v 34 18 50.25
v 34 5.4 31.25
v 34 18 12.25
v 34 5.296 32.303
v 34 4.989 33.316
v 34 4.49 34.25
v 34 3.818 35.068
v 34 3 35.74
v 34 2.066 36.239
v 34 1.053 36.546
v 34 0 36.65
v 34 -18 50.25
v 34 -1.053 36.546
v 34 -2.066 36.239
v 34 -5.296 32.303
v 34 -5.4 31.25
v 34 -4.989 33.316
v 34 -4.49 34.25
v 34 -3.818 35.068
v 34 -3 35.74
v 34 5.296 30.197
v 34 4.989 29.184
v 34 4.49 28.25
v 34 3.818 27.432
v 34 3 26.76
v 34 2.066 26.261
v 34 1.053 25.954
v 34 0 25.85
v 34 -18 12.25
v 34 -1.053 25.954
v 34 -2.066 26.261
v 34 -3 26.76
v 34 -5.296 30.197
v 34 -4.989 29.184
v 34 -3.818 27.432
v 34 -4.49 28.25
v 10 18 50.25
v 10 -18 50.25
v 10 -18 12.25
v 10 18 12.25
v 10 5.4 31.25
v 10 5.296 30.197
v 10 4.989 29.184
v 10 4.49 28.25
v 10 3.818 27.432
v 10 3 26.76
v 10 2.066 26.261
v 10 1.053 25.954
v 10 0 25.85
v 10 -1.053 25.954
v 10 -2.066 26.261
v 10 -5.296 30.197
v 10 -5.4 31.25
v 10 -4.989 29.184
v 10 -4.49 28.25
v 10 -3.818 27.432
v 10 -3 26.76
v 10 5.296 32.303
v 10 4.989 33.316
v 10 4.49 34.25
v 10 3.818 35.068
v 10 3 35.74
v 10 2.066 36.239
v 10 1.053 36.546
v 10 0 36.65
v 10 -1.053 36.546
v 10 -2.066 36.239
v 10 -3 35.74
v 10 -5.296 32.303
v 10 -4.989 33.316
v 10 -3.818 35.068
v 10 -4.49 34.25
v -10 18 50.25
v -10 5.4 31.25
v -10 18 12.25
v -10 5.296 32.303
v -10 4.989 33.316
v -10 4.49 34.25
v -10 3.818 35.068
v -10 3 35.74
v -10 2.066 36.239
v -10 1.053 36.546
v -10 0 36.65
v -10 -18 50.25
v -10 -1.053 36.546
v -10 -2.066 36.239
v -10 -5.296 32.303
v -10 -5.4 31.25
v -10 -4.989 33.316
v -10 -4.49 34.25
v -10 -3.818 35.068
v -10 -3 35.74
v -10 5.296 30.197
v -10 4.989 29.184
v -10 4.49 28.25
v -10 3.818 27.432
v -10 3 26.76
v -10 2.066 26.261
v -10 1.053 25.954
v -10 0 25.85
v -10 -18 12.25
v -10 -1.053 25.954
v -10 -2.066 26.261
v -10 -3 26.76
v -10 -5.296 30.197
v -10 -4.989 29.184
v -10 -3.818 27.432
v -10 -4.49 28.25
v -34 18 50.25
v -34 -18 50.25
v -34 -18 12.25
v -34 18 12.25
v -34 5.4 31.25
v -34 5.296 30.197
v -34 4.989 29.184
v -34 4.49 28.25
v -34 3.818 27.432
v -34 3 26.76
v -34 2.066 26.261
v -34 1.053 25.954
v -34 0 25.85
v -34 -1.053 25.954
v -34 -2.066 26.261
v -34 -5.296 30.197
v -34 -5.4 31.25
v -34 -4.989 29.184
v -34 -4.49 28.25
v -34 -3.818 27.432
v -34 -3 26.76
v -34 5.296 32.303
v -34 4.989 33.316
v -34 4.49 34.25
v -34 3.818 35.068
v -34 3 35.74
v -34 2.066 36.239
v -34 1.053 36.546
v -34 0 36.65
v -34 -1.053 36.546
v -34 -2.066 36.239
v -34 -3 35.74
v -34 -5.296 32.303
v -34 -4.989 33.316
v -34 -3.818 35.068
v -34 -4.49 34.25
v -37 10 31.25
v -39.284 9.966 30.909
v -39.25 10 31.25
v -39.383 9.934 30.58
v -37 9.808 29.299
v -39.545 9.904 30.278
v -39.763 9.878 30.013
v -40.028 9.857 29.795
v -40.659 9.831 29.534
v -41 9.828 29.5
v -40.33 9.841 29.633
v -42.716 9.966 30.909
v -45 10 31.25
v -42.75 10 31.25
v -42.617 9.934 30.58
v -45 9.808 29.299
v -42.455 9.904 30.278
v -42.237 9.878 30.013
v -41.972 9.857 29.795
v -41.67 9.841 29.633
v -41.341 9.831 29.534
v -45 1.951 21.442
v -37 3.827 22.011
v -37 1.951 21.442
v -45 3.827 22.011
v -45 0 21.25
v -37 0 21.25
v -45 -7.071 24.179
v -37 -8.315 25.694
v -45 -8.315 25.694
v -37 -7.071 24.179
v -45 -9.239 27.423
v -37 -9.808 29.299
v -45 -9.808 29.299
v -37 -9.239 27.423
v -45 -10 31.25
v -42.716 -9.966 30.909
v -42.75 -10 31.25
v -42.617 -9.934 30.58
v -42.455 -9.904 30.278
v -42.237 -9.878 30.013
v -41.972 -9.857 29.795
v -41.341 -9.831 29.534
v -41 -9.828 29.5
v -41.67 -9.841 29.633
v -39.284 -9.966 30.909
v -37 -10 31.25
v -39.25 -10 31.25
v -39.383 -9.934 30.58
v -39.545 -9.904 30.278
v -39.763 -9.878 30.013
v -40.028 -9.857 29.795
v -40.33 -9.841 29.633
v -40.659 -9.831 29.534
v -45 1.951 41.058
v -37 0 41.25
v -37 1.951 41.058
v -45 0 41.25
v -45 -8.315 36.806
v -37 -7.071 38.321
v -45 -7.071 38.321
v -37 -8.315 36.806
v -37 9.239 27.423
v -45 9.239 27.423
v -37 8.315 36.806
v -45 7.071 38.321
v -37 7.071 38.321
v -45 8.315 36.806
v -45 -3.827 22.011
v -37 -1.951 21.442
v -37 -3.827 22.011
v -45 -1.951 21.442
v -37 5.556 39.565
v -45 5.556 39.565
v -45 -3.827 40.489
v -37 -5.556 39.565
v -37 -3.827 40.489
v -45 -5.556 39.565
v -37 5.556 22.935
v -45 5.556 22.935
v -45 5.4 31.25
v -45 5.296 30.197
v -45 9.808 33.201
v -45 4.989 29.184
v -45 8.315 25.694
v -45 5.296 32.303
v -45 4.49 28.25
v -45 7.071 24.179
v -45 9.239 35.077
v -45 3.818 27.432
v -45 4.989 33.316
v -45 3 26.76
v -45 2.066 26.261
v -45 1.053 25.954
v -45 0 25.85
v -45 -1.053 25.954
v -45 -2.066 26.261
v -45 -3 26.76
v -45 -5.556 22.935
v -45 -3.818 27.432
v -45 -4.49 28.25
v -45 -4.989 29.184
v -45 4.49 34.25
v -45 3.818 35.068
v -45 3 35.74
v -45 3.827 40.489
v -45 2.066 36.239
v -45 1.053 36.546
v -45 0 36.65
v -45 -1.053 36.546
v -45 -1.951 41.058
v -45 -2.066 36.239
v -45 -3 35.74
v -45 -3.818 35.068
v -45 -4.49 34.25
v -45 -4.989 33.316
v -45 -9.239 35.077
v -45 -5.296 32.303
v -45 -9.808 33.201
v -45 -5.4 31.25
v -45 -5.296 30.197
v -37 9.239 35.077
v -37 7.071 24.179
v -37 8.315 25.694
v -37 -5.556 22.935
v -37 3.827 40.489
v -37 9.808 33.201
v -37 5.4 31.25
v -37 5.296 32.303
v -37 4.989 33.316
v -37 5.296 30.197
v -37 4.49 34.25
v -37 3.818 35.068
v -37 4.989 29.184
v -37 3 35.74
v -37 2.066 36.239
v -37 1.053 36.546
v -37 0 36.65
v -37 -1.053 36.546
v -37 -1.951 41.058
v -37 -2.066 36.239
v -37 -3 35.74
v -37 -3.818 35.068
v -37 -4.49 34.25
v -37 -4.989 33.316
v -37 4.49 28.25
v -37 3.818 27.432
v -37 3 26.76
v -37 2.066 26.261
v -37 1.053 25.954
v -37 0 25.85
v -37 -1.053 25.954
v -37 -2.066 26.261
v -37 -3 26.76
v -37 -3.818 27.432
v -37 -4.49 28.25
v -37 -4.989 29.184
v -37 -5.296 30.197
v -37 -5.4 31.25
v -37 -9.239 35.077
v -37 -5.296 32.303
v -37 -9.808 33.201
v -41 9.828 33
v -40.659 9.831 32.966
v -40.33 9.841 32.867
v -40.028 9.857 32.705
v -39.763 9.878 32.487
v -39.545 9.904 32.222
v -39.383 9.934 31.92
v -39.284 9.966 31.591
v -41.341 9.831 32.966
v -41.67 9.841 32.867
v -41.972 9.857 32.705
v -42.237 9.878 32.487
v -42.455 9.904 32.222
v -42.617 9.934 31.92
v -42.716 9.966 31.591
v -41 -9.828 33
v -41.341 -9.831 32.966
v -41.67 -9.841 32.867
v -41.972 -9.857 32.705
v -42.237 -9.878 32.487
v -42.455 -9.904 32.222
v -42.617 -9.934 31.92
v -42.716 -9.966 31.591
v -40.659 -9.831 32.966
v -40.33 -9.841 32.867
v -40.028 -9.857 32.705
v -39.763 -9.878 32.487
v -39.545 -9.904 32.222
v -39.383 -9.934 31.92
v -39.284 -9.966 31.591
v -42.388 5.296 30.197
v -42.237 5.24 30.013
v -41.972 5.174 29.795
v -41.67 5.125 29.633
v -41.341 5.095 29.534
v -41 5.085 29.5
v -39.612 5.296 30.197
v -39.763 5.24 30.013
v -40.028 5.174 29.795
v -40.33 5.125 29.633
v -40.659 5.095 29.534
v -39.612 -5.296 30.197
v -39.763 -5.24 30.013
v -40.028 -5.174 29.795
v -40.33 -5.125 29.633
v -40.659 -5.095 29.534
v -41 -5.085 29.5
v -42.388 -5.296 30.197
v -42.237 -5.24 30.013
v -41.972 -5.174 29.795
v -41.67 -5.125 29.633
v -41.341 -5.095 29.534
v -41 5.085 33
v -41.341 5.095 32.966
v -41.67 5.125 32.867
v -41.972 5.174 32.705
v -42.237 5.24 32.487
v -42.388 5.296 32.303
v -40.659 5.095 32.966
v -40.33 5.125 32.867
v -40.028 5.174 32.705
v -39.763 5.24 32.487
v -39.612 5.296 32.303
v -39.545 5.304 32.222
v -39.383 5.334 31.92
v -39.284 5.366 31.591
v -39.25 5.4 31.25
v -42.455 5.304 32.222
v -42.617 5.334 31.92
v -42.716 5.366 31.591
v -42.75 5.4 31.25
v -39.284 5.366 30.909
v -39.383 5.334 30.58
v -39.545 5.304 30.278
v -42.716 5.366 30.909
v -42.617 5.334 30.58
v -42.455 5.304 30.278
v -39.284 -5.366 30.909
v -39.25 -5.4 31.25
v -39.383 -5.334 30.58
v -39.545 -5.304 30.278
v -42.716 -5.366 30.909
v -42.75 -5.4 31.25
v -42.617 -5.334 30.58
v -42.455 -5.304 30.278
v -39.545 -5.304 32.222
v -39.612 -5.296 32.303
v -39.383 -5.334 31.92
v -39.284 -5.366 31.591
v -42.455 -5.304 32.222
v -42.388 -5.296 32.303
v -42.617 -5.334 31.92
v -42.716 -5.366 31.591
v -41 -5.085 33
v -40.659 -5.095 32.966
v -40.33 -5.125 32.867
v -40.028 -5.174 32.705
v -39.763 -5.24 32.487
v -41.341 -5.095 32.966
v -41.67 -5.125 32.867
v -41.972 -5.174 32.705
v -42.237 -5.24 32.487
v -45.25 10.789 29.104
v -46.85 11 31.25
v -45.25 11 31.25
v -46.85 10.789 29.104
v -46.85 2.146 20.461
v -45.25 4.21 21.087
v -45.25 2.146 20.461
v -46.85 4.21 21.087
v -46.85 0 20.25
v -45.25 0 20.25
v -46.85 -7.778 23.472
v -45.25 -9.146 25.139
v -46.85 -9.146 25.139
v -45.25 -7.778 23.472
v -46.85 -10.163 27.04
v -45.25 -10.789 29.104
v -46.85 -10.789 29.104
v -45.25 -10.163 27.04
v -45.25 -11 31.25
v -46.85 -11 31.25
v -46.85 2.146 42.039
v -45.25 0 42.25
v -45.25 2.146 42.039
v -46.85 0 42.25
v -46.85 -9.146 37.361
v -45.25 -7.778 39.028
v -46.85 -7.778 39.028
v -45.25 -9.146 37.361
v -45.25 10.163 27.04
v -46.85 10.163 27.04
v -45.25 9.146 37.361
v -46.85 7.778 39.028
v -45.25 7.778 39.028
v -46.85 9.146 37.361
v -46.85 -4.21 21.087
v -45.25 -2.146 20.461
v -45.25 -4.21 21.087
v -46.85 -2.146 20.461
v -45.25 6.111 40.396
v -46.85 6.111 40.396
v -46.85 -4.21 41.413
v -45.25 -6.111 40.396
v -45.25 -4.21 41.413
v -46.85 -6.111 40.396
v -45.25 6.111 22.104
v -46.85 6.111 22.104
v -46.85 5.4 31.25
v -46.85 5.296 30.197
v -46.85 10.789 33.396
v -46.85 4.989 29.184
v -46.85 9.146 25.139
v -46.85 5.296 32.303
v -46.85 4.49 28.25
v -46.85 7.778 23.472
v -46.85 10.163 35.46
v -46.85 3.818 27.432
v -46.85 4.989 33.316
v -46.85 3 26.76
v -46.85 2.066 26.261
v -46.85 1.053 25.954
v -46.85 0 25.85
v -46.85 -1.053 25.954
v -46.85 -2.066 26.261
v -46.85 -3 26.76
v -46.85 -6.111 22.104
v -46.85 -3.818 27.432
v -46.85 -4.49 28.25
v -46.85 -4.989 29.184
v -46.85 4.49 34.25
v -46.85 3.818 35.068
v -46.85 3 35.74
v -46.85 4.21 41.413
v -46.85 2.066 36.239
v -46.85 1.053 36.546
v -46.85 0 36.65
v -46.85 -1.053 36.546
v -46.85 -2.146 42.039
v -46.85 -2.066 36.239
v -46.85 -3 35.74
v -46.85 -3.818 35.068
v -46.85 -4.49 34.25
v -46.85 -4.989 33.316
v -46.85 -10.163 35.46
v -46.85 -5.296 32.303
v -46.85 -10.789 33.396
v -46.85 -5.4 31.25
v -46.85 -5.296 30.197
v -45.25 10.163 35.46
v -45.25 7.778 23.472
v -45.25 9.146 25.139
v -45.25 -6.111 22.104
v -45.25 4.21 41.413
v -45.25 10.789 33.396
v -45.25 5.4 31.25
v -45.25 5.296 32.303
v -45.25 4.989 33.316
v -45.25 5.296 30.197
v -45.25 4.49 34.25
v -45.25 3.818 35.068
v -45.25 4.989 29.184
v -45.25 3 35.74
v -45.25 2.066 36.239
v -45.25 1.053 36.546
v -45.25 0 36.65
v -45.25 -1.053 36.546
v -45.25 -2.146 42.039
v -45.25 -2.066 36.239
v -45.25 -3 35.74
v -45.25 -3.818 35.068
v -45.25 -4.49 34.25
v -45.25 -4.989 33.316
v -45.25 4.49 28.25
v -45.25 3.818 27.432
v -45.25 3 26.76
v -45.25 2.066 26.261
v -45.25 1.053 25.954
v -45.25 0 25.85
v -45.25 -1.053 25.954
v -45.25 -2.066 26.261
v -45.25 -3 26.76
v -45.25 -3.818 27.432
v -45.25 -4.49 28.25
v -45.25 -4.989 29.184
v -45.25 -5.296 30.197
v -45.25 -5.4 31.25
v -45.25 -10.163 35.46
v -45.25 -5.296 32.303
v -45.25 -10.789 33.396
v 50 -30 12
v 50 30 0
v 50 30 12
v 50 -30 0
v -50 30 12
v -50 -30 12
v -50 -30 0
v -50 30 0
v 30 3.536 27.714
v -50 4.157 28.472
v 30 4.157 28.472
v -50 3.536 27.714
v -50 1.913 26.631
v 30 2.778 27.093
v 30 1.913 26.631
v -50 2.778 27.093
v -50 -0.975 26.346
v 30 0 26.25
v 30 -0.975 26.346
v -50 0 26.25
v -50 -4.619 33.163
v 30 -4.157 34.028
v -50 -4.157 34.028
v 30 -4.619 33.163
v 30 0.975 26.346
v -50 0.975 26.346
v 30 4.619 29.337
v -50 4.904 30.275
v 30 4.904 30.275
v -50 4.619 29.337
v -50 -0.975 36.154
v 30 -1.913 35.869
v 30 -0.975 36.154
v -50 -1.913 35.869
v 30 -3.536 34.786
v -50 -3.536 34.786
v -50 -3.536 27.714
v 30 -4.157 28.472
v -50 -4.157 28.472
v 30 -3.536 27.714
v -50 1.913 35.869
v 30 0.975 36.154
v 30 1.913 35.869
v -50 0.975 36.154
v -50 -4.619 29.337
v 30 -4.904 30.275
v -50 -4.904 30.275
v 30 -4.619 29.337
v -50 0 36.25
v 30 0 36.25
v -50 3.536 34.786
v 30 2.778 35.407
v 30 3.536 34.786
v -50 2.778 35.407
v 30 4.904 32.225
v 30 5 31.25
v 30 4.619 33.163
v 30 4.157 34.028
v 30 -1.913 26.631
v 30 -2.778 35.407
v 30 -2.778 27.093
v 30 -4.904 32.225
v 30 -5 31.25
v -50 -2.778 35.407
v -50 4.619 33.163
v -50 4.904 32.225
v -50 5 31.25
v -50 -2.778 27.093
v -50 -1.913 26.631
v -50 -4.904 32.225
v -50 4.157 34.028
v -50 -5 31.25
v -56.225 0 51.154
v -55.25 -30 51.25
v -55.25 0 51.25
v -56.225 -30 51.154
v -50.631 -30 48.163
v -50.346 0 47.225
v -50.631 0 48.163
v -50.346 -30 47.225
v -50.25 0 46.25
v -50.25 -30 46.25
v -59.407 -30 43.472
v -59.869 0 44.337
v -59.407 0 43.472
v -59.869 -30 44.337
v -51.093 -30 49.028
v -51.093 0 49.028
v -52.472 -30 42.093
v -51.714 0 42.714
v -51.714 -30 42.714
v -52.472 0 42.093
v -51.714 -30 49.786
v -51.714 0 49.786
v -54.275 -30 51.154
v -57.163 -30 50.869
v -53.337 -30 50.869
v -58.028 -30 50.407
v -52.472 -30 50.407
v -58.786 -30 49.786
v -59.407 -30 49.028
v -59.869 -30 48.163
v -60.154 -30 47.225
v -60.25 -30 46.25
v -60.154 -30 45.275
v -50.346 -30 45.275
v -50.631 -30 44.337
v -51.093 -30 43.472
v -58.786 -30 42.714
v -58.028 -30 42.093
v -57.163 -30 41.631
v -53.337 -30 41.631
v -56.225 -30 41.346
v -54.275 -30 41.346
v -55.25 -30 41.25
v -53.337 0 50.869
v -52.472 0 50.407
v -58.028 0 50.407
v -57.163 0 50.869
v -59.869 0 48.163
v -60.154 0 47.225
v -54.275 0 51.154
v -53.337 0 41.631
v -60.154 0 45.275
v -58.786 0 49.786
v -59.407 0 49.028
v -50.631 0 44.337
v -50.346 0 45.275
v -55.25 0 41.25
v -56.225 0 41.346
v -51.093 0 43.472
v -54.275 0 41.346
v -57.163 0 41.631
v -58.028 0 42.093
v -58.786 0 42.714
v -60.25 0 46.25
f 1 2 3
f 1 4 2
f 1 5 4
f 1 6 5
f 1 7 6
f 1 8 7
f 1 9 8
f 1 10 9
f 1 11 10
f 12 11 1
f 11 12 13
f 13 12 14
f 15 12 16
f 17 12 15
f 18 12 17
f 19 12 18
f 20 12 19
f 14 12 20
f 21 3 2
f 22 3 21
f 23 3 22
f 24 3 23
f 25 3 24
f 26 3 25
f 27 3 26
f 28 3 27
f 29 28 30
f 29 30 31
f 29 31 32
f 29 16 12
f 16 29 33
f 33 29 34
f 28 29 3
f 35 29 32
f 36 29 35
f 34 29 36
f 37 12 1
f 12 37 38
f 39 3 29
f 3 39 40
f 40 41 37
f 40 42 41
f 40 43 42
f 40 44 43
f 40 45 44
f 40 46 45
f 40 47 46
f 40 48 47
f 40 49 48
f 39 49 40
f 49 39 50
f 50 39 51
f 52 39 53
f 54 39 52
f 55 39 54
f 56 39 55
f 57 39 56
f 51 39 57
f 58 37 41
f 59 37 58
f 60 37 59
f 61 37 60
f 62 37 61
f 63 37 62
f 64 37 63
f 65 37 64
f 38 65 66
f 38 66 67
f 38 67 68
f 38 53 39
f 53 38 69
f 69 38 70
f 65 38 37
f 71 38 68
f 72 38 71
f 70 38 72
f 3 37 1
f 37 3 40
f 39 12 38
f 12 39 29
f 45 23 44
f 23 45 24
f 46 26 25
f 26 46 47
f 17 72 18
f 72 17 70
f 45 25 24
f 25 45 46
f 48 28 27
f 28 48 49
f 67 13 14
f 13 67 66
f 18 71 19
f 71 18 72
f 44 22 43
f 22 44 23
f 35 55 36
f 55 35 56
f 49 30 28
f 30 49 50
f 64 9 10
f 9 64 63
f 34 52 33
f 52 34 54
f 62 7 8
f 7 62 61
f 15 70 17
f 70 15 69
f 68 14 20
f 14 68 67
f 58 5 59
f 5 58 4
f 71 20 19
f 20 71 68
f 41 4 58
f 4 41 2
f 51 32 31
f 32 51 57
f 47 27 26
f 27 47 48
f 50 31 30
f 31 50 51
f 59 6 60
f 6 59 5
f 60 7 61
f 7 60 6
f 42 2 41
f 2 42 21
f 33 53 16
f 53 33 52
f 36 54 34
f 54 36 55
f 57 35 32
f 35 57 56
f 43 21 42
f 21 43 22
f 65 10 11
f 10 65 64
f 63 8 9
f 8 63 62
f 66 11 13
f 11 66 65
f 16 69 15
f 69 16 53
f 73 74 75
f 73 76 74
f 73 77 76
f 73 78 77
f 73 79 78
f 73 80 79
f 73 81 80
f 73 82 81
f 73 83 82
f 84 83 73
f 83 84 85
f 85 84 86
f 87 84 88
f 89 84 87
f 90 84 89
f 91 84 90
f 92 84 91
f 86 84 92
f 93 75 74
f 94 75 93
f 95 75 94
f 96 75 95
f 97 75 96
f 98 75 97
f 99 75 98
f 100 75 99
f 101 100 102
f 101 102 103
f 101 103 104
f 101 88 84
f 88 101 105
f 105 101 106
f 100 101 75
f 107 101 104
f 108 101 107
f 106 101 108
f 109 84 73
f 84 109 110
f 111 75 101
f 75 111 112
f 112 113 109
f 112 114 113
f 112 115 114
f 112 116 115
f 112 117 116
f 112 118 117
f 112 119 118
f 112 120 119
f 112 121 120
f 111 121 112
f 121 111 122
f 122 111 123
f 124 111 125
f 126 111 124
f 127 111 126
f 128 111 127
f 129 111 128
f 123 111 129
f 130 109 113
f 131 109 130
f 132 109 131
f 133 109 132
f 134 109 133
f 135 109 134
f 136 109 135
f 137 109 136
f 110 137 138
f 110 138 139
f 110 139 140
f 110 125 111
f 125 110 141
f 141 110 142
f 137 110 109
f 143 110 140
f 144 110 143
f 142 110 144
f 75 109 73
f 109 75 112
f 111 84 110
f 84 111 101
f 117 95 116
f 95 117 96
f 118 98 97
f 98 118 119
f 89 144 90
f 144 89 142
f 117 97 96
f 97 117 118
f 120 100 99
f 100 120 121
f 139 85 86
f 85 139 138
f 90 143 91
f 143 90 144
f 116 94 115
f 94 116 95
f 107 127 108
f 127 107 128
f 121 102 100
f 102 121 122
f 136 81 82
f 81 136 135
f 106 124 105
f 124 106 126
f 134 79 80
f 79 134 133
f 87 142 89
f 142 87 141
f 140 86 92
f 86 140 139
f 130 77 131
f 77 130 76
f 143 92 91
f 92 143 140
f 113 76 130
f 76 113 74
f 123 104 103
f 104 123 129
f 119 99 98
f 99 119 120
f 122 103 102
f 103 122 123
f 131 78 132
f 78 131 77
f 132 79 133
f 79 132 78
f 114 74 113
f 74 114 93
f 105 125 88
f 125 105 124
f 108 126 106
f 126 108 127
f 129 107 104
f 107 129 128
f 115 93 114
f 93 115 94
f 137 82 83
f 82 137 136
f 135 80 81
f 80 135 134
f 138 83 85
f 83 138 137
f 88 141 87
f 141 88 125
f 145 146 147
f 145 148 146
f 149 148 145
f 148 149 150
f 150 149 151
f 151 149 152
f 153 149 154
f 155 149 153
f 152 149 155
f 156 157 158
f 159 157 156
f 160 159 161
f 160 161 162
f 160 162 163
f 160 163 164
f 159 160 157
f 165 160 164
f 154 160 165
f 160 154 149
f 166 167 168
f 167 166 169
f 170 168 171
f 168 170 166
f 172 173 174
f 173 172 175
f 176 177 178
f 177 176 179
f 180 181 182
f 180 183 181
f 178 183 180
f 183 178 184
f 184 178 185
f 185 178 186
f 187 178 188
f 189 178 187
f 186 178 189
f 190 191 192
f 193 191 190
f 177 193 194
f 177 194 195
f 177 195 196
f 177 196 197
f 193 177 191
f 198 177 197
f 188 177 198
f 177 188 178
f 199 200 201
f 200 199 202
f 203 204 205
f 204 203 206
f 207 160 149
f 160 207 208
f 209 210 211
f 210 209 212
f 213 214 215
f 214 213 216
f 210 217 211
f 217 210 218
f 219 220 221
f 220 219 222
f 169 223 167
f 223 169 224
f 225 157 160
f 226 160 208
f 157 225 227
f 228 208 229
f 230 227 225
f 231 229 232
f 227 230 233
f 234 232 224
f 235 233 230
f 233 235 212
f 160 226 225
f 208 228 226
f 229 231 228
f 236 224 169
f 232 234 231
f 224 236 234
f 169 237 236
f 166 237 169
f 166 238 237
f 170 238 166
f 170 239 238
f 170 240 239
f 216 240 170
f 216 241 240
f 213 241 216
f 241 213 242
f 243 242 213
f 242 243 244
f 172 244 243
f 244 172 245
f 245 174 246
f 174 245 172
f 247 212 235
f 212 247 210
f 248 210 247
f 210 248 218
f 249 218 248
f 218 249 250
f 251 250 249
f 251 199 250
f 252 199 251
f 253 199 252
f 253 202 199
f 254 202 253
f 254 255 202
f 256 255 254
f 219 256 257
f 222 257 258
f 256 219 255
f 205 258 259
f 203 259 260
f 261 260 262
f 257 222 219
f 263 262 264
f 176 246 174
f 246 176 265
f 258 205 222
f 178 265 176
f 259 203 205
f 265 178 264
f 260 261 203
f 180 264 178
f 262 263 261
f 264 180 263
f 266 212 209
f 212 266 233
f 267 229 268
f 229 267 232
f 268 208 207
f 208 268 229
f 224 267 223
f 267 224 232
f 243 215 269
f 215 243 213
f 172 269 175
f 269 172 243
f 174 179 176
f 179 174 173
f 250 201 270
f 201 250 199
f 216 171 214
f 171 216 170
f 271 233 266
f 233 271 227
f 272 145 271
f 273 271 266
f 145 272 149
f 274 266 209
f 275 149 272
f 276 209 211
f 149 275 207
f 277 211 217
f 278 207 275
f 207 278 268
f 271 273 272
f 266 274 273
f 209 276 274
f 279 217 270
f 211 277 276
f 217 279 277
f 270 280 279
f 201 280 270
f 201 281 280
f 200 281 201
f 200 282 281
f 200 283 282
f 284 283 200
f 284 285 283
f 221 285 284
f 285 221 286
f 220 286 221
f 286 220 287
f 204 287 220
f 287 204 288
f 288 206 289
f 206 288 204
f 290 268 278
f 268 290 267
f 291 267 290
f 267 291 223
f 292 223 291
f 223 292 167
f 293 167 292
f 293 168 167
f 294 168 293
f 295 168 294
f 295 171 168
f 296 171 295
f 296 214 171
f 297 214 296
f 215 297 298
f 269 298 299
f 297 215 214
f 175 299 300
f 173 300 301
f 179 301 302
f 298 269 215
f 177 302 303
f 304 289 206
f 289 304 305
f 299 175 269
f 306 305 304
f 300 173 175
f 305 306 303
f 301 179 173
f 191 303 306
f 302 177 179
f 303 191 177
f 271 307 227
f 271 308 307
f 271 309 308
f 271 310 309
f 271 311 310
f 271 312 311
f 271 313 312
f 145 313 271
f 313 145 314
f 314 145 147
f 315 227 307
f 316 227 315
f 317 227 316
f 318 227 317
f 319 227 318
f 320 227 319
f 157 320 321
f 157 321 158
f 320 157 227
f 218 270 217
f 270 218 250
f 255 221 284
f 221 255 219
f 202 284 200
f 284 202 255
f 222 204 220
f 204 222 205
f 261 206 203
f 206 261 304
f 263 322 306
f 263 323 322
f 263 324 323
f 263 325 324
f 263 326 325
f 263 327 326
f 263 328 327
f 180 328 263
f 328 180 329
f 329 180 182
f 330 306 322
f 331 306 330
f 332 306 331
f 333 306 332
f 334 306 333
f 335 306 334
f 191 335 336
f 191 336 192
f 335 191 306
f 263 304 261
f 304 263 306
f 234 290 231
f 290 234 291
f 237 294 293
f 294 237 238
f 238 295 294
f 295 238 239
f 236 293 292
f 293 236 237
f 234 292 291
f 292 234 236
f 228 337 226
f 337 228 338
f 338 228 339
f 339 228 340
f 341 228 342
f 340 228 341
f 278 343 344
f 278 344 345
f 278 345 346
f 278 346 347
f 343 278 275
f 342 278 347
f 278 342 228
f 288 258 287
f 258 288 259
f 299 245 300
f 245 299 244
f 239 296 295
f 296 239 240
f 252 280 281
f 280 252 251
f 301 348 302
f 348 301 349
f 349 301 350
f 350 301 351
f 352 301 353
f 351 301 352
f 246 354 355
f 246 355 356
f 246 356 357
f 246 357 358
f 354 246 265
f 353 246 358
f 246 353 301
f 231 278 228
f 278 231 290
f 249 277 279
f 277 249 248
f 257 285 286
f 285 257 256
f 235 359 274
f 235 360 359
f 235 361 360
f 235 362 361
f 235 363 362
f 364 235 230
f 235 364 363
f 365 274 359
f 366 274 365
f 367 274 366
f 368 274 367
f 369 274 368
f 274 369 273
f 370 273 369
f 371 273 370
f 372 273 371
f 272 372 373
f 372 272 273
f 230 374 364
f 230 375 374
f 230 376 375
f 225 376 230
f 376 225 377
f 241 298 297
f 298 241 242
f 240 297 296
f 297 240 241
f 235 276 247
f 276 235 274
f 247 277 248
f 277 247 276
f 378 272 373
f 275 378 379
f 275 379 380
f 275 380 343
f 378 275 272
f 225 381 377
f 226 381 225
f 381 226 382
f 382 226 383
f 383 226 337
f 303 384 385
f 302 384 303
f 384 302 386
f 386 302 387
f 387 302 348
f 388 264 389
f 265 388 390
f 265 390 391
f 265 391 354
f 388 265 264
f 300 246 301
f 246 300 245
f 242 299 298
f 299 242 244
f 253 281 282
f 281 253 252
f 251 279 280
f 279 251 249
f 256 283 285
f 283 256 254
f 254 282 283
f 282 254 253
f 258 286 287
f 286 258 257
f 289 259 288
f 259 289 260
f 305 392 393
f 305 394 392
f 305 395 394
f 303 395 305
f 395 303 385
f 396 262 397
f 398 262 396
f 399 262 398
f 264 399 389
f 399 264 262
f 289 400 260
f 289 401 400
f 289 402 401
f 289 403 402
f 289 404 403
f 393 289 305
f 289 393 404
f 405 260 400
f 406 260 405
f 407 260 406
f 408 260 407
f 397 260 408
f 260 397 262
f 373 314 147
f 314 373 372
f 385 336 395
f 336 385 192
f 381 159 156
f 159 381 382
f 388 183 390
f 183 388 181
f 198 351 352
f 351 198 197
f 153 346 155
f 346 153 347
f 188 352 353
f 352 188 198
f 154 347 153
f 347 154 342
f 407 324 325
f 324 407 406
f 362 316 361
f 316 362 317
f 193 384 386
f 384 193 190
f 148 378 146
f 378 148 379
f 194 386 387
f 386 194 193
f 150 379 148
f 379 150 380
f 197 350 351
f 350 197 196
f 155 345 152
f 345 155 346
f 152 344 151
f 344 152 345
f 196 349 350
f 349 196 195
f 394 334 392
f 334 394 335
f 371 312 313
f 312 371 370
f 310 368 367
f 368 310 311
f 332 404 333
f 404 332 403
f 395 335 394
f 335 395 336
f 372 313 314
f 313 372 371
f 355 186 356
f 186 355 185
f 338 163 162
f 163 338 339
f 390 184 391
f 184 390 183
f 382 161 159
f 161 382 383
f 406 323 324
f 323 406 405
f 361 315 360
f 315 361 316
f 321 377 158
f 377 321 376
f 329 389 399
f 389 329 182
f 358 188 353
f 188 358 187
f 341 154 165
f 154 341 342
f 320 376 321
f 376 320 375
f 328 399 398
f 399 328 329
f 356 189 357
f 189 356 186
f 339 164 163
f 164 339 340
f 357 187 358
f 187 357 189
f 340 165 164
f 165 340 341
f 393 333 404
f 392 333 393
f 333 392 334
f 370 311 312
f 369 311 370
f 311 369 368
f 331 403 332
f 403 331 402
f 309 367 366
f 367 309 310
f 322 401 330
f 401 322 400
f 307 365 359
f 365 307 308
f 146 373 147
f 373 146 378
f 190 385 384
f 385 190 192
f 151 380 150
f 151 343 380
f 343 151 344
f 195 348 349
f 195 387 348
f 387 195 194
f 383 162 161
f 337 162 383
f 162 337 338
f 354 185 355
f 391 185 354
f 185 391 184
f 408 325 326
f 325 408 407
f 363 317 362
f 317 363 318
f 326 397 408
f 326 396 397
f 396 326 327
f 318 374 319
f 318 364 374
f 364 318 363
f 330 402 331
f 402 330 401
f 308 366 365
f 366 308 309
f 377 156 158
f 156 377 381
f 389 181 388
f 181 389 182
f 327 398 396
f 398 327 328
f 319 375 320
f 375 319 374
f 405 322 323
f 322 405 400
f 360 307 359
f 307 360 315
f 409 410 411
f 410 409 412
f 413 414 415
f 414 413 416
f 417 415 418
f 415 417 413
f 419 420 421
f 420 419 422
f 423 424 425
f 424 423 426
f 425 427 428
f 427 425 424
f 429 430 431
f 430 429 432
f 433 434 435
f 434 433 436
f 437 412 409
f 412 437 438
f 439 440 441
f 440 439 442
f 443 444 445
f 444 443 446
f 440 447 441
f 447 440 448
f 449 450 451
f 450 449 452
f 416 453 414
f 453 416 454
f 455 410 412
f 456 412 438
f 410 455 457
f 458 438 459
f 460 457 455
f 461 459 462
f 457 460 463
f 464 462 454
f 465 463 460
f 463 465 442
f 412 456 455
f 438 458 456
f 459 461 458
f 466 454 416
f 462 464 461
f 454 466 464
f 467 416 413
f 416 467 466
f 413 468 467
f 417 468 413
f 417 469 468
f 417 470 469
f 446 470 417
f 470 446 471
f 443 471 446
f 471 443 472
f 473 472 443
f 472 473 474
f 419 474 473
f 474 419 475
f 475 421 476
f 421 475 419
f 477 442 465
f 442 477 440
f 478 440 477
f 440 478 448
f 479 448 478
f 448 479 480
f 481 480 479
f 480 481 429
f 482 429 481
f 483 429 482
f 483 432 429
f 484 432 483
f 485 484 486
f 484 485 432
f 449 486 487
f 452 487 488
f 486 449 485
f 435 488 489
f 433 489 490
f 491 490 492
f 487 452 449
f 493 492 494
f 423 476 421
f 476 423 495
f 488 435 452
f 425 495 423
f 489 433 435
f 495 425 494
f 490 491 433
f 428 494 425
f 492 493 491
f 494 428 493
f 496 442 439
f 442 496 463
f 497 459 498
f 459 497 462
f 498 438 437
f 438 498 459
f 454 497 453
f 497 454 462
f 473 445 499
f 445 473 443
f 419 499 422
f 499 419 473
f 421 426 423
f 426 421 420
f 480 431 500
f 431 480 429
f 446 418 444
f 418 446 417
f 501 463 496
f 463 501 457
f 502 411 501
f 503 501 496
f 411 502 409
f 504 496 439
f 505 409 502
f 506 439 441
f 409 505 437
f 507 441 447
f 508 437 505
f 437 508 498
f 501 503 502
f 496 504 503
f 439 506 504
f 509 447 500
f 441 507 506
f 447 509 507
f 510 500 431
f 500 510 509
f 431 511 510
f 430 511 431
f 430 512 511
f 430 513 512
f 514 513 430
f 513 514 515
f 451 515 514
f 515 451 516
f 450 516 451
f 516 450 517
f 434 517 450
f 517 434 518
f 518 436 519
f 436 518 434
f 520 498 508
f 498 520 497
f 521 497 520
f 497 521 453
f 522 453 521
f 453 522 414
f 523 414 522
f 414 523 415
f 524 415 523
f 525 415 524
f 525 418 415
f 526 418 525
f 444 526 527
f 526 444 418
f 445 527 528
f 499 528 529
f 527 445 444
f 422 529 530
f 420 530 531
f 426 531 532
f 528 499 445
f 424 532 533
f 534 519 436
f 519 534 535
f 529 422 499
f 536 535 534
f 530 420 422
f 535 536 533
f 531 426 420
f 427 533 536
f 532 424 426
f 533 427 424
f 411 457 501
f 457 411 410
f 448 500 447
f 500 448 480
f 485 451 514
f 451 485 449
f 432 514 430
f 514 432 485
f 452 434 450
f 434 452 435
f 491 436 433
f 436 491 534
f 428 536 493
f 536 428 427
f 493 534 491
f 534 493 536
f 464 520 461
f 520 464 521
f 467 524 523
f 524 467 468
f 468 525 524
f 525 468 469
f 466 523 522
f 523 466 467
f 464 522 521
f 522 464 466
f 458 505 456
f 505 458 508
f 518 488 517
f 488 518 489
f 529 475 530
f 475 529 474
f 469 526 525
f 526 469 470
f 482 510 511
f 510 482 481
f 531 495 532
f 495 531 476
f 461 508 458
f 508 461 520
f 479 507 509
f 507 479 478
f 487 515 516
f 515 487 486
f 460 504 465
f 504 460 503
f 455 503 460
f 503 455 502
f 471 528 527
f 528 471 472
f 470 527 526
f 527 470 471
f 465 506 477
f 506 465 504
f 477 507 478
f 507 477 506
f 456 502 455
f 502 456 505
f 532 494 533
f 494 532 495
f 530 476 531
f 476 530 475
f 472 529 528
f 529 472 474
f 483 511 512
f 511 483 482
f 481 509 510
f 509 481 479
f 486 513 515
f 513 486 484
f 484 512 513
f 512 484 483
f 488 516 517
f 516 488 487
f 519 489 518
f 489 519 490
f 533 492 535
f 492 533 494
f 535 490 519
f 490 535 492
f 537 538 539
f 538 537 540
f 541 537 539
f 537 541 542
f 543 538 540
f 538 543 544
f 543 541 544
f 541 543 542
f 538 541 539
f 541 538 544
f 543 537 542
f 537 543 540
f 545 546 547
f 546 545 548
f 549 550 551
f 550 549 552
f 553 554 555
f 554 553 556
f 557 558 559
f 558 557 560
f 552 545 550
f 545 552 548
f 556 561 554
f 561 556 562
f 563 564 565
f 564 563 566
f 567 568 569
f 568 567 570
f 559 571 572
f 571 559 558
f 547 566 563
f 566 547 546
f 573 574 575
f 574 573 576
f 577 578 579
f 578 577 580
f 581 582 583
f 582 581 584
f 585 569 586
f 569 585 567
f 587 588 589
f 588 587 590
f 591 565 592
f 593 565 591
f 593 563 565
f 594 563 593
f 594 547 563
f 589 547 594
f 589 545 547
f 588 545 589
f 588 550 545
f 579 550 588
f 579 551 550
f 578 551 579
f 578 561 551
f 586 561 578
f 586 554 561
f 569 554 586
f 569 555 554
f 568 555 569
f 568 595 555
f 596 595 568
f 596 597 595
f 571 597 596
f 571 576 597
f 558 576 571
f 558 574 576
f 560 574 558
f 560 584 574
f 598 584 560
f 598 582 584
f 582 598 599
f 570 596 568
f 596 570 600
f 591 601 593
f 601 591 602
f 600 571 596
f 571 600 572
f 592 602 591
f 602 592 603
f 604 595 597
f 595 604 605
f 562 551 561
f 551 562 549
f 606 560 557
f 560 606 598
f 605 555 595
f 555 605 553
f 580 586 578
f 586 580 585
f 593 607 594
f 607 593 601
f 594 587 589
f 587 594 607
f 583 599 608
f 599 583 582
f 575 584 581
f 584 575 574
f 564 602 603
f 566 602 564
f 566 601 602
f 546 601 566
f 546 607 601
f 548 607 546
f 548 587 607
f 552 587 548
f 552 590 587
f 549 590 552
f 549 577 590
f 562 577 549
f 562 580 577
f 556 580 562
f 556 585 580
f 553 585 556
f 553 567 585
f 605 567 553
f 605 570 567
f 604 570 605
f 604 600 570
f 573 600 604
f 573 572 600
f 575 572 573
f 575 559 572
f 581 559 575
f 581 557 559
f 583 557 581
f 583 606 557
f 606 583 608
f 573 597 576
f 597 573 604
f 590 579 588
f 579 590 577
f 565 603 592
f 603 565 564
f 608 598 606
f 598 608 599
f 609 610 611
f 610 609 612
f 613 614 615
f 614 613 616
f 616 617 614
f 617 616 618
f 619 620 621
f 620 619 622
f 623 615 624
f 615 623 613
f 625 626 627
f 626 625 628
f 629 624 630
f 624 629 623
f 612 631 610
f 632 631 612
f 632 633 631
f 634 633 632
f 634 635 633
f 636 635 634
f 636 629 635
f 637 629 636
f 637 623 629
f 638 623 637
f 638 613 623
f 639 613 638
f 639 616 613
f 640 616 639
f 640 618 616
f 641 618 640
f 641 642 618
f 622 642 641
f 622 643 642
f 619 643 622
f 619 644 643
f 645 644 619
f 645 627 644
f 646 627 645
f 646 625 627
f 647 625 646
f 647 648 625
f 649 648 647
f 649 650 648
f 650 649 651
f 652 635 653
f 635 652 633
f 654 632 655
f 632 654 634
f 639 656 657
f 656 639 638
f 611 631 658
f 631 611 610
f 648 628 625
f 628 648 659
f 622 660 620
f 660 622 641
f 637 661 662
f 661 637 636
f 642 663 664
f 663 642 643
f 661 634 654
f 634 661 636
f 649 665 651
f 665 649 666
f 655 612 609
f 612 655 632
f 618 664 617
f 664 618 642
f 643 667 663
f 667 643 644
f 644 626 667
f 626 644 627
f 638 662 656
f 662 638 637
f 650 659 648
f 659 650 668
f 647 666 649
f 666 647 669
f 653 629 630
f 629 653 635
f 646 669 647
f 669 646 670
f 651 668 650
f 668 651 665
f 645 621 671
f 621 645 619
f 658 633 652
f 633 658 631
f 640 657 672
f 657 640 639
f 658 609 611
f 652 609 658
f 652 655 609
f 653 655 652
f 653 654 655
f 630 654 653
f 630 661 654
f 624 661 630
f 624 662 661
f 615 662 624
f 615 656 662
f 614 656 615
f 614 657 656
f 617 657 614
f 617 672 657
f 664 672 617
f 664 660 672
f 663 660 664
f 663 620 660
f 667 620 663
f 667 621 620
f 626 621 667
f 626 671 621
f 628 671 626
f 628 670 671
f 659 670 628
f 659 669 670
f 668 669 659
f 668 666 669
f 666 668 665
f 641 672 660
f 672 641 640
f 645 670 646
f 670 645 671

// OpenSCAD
$fn = 32;

// ------------------------------------------------------------------------
// Machine vise: screw d10, jaws 24 x 38 mm
// Every part is its own module, assembly() places every instance.
// ------------------------------------------------------------------------

// --- part 1 ---
module vise_bed() {
  difference() {
    translate([-50, -30, 0]) cube([100, 60, 12]);
  }
}

// --- part 2 ---
module vise_jaw() {
  difference() {
    translate([-12, -18, 0]) cube([24, 36, 38]);
    translate([0, 0, 19]) rotate([0, 90, 0]) cylinder(h = 26, d = 10.8, center = true);
  }
}

// --- part 3 ---
module vise_screw() {
  translate([0, 0, -40]) cylinder(h = 80, d = 10);
}

// --- part 4 ---
module screw_collar() {
  difference() {
    cylinder(h = 8, d = 20);
    translate([0, 0, -1]) cylinder(h = 10, d = 10.8);
    translate([0, 0, 4]) rotate([90, 0, 0]) cylinder(h = 22, d = 3.5, center = true);
  }
}

// --- part 5 ---
module screw_washer() {
  difference() {
      translate([0, 0, 0]) cylinder(h = 1.6, d = 22);
      translate([0, 0, -1]) cylinder(h = 3.6, d = 10.8);
    }
}

// --- part 6 ---
module vise_handle() {
  cylinder(h = 30, d = 10);
}

// --- assembly ---
module assembly() {
  color([0.80, 0.24, 0.20]) translate([0, 0, 0]) rotate([0, 0, 0]) vise_bed();
  color([0.20, 0.45, 0.75]) translate([22, 0, 12.25]) rotate([0, 0, 0]) vise_jaw();
  color([0.25, 0.62, 0.32]) translate([-22, 0, 12.25]) rotate([0, 0, 0]) vise_jaw();
  color([0.92, 0.70, 0.18]) translate([-10, 0, 31.25]) rotate([0, 90, 0]) vise_screw();
  color([0.58, 0.35, 0.70]) translate([-45, 0, 31.25]) rotate([0, 90, 0]) screw_collar();
  color([0.16, 0.66, 0.66]) translate([-46.85, 0, 31.25]) rotate([0, 90, 0]) screw_washer();
  color([0.85, 0.48, 0.18]) translate([-55.25, 0, 46.25]) rotate([90, 0, 0]) vise_handle();
}

assembly();
